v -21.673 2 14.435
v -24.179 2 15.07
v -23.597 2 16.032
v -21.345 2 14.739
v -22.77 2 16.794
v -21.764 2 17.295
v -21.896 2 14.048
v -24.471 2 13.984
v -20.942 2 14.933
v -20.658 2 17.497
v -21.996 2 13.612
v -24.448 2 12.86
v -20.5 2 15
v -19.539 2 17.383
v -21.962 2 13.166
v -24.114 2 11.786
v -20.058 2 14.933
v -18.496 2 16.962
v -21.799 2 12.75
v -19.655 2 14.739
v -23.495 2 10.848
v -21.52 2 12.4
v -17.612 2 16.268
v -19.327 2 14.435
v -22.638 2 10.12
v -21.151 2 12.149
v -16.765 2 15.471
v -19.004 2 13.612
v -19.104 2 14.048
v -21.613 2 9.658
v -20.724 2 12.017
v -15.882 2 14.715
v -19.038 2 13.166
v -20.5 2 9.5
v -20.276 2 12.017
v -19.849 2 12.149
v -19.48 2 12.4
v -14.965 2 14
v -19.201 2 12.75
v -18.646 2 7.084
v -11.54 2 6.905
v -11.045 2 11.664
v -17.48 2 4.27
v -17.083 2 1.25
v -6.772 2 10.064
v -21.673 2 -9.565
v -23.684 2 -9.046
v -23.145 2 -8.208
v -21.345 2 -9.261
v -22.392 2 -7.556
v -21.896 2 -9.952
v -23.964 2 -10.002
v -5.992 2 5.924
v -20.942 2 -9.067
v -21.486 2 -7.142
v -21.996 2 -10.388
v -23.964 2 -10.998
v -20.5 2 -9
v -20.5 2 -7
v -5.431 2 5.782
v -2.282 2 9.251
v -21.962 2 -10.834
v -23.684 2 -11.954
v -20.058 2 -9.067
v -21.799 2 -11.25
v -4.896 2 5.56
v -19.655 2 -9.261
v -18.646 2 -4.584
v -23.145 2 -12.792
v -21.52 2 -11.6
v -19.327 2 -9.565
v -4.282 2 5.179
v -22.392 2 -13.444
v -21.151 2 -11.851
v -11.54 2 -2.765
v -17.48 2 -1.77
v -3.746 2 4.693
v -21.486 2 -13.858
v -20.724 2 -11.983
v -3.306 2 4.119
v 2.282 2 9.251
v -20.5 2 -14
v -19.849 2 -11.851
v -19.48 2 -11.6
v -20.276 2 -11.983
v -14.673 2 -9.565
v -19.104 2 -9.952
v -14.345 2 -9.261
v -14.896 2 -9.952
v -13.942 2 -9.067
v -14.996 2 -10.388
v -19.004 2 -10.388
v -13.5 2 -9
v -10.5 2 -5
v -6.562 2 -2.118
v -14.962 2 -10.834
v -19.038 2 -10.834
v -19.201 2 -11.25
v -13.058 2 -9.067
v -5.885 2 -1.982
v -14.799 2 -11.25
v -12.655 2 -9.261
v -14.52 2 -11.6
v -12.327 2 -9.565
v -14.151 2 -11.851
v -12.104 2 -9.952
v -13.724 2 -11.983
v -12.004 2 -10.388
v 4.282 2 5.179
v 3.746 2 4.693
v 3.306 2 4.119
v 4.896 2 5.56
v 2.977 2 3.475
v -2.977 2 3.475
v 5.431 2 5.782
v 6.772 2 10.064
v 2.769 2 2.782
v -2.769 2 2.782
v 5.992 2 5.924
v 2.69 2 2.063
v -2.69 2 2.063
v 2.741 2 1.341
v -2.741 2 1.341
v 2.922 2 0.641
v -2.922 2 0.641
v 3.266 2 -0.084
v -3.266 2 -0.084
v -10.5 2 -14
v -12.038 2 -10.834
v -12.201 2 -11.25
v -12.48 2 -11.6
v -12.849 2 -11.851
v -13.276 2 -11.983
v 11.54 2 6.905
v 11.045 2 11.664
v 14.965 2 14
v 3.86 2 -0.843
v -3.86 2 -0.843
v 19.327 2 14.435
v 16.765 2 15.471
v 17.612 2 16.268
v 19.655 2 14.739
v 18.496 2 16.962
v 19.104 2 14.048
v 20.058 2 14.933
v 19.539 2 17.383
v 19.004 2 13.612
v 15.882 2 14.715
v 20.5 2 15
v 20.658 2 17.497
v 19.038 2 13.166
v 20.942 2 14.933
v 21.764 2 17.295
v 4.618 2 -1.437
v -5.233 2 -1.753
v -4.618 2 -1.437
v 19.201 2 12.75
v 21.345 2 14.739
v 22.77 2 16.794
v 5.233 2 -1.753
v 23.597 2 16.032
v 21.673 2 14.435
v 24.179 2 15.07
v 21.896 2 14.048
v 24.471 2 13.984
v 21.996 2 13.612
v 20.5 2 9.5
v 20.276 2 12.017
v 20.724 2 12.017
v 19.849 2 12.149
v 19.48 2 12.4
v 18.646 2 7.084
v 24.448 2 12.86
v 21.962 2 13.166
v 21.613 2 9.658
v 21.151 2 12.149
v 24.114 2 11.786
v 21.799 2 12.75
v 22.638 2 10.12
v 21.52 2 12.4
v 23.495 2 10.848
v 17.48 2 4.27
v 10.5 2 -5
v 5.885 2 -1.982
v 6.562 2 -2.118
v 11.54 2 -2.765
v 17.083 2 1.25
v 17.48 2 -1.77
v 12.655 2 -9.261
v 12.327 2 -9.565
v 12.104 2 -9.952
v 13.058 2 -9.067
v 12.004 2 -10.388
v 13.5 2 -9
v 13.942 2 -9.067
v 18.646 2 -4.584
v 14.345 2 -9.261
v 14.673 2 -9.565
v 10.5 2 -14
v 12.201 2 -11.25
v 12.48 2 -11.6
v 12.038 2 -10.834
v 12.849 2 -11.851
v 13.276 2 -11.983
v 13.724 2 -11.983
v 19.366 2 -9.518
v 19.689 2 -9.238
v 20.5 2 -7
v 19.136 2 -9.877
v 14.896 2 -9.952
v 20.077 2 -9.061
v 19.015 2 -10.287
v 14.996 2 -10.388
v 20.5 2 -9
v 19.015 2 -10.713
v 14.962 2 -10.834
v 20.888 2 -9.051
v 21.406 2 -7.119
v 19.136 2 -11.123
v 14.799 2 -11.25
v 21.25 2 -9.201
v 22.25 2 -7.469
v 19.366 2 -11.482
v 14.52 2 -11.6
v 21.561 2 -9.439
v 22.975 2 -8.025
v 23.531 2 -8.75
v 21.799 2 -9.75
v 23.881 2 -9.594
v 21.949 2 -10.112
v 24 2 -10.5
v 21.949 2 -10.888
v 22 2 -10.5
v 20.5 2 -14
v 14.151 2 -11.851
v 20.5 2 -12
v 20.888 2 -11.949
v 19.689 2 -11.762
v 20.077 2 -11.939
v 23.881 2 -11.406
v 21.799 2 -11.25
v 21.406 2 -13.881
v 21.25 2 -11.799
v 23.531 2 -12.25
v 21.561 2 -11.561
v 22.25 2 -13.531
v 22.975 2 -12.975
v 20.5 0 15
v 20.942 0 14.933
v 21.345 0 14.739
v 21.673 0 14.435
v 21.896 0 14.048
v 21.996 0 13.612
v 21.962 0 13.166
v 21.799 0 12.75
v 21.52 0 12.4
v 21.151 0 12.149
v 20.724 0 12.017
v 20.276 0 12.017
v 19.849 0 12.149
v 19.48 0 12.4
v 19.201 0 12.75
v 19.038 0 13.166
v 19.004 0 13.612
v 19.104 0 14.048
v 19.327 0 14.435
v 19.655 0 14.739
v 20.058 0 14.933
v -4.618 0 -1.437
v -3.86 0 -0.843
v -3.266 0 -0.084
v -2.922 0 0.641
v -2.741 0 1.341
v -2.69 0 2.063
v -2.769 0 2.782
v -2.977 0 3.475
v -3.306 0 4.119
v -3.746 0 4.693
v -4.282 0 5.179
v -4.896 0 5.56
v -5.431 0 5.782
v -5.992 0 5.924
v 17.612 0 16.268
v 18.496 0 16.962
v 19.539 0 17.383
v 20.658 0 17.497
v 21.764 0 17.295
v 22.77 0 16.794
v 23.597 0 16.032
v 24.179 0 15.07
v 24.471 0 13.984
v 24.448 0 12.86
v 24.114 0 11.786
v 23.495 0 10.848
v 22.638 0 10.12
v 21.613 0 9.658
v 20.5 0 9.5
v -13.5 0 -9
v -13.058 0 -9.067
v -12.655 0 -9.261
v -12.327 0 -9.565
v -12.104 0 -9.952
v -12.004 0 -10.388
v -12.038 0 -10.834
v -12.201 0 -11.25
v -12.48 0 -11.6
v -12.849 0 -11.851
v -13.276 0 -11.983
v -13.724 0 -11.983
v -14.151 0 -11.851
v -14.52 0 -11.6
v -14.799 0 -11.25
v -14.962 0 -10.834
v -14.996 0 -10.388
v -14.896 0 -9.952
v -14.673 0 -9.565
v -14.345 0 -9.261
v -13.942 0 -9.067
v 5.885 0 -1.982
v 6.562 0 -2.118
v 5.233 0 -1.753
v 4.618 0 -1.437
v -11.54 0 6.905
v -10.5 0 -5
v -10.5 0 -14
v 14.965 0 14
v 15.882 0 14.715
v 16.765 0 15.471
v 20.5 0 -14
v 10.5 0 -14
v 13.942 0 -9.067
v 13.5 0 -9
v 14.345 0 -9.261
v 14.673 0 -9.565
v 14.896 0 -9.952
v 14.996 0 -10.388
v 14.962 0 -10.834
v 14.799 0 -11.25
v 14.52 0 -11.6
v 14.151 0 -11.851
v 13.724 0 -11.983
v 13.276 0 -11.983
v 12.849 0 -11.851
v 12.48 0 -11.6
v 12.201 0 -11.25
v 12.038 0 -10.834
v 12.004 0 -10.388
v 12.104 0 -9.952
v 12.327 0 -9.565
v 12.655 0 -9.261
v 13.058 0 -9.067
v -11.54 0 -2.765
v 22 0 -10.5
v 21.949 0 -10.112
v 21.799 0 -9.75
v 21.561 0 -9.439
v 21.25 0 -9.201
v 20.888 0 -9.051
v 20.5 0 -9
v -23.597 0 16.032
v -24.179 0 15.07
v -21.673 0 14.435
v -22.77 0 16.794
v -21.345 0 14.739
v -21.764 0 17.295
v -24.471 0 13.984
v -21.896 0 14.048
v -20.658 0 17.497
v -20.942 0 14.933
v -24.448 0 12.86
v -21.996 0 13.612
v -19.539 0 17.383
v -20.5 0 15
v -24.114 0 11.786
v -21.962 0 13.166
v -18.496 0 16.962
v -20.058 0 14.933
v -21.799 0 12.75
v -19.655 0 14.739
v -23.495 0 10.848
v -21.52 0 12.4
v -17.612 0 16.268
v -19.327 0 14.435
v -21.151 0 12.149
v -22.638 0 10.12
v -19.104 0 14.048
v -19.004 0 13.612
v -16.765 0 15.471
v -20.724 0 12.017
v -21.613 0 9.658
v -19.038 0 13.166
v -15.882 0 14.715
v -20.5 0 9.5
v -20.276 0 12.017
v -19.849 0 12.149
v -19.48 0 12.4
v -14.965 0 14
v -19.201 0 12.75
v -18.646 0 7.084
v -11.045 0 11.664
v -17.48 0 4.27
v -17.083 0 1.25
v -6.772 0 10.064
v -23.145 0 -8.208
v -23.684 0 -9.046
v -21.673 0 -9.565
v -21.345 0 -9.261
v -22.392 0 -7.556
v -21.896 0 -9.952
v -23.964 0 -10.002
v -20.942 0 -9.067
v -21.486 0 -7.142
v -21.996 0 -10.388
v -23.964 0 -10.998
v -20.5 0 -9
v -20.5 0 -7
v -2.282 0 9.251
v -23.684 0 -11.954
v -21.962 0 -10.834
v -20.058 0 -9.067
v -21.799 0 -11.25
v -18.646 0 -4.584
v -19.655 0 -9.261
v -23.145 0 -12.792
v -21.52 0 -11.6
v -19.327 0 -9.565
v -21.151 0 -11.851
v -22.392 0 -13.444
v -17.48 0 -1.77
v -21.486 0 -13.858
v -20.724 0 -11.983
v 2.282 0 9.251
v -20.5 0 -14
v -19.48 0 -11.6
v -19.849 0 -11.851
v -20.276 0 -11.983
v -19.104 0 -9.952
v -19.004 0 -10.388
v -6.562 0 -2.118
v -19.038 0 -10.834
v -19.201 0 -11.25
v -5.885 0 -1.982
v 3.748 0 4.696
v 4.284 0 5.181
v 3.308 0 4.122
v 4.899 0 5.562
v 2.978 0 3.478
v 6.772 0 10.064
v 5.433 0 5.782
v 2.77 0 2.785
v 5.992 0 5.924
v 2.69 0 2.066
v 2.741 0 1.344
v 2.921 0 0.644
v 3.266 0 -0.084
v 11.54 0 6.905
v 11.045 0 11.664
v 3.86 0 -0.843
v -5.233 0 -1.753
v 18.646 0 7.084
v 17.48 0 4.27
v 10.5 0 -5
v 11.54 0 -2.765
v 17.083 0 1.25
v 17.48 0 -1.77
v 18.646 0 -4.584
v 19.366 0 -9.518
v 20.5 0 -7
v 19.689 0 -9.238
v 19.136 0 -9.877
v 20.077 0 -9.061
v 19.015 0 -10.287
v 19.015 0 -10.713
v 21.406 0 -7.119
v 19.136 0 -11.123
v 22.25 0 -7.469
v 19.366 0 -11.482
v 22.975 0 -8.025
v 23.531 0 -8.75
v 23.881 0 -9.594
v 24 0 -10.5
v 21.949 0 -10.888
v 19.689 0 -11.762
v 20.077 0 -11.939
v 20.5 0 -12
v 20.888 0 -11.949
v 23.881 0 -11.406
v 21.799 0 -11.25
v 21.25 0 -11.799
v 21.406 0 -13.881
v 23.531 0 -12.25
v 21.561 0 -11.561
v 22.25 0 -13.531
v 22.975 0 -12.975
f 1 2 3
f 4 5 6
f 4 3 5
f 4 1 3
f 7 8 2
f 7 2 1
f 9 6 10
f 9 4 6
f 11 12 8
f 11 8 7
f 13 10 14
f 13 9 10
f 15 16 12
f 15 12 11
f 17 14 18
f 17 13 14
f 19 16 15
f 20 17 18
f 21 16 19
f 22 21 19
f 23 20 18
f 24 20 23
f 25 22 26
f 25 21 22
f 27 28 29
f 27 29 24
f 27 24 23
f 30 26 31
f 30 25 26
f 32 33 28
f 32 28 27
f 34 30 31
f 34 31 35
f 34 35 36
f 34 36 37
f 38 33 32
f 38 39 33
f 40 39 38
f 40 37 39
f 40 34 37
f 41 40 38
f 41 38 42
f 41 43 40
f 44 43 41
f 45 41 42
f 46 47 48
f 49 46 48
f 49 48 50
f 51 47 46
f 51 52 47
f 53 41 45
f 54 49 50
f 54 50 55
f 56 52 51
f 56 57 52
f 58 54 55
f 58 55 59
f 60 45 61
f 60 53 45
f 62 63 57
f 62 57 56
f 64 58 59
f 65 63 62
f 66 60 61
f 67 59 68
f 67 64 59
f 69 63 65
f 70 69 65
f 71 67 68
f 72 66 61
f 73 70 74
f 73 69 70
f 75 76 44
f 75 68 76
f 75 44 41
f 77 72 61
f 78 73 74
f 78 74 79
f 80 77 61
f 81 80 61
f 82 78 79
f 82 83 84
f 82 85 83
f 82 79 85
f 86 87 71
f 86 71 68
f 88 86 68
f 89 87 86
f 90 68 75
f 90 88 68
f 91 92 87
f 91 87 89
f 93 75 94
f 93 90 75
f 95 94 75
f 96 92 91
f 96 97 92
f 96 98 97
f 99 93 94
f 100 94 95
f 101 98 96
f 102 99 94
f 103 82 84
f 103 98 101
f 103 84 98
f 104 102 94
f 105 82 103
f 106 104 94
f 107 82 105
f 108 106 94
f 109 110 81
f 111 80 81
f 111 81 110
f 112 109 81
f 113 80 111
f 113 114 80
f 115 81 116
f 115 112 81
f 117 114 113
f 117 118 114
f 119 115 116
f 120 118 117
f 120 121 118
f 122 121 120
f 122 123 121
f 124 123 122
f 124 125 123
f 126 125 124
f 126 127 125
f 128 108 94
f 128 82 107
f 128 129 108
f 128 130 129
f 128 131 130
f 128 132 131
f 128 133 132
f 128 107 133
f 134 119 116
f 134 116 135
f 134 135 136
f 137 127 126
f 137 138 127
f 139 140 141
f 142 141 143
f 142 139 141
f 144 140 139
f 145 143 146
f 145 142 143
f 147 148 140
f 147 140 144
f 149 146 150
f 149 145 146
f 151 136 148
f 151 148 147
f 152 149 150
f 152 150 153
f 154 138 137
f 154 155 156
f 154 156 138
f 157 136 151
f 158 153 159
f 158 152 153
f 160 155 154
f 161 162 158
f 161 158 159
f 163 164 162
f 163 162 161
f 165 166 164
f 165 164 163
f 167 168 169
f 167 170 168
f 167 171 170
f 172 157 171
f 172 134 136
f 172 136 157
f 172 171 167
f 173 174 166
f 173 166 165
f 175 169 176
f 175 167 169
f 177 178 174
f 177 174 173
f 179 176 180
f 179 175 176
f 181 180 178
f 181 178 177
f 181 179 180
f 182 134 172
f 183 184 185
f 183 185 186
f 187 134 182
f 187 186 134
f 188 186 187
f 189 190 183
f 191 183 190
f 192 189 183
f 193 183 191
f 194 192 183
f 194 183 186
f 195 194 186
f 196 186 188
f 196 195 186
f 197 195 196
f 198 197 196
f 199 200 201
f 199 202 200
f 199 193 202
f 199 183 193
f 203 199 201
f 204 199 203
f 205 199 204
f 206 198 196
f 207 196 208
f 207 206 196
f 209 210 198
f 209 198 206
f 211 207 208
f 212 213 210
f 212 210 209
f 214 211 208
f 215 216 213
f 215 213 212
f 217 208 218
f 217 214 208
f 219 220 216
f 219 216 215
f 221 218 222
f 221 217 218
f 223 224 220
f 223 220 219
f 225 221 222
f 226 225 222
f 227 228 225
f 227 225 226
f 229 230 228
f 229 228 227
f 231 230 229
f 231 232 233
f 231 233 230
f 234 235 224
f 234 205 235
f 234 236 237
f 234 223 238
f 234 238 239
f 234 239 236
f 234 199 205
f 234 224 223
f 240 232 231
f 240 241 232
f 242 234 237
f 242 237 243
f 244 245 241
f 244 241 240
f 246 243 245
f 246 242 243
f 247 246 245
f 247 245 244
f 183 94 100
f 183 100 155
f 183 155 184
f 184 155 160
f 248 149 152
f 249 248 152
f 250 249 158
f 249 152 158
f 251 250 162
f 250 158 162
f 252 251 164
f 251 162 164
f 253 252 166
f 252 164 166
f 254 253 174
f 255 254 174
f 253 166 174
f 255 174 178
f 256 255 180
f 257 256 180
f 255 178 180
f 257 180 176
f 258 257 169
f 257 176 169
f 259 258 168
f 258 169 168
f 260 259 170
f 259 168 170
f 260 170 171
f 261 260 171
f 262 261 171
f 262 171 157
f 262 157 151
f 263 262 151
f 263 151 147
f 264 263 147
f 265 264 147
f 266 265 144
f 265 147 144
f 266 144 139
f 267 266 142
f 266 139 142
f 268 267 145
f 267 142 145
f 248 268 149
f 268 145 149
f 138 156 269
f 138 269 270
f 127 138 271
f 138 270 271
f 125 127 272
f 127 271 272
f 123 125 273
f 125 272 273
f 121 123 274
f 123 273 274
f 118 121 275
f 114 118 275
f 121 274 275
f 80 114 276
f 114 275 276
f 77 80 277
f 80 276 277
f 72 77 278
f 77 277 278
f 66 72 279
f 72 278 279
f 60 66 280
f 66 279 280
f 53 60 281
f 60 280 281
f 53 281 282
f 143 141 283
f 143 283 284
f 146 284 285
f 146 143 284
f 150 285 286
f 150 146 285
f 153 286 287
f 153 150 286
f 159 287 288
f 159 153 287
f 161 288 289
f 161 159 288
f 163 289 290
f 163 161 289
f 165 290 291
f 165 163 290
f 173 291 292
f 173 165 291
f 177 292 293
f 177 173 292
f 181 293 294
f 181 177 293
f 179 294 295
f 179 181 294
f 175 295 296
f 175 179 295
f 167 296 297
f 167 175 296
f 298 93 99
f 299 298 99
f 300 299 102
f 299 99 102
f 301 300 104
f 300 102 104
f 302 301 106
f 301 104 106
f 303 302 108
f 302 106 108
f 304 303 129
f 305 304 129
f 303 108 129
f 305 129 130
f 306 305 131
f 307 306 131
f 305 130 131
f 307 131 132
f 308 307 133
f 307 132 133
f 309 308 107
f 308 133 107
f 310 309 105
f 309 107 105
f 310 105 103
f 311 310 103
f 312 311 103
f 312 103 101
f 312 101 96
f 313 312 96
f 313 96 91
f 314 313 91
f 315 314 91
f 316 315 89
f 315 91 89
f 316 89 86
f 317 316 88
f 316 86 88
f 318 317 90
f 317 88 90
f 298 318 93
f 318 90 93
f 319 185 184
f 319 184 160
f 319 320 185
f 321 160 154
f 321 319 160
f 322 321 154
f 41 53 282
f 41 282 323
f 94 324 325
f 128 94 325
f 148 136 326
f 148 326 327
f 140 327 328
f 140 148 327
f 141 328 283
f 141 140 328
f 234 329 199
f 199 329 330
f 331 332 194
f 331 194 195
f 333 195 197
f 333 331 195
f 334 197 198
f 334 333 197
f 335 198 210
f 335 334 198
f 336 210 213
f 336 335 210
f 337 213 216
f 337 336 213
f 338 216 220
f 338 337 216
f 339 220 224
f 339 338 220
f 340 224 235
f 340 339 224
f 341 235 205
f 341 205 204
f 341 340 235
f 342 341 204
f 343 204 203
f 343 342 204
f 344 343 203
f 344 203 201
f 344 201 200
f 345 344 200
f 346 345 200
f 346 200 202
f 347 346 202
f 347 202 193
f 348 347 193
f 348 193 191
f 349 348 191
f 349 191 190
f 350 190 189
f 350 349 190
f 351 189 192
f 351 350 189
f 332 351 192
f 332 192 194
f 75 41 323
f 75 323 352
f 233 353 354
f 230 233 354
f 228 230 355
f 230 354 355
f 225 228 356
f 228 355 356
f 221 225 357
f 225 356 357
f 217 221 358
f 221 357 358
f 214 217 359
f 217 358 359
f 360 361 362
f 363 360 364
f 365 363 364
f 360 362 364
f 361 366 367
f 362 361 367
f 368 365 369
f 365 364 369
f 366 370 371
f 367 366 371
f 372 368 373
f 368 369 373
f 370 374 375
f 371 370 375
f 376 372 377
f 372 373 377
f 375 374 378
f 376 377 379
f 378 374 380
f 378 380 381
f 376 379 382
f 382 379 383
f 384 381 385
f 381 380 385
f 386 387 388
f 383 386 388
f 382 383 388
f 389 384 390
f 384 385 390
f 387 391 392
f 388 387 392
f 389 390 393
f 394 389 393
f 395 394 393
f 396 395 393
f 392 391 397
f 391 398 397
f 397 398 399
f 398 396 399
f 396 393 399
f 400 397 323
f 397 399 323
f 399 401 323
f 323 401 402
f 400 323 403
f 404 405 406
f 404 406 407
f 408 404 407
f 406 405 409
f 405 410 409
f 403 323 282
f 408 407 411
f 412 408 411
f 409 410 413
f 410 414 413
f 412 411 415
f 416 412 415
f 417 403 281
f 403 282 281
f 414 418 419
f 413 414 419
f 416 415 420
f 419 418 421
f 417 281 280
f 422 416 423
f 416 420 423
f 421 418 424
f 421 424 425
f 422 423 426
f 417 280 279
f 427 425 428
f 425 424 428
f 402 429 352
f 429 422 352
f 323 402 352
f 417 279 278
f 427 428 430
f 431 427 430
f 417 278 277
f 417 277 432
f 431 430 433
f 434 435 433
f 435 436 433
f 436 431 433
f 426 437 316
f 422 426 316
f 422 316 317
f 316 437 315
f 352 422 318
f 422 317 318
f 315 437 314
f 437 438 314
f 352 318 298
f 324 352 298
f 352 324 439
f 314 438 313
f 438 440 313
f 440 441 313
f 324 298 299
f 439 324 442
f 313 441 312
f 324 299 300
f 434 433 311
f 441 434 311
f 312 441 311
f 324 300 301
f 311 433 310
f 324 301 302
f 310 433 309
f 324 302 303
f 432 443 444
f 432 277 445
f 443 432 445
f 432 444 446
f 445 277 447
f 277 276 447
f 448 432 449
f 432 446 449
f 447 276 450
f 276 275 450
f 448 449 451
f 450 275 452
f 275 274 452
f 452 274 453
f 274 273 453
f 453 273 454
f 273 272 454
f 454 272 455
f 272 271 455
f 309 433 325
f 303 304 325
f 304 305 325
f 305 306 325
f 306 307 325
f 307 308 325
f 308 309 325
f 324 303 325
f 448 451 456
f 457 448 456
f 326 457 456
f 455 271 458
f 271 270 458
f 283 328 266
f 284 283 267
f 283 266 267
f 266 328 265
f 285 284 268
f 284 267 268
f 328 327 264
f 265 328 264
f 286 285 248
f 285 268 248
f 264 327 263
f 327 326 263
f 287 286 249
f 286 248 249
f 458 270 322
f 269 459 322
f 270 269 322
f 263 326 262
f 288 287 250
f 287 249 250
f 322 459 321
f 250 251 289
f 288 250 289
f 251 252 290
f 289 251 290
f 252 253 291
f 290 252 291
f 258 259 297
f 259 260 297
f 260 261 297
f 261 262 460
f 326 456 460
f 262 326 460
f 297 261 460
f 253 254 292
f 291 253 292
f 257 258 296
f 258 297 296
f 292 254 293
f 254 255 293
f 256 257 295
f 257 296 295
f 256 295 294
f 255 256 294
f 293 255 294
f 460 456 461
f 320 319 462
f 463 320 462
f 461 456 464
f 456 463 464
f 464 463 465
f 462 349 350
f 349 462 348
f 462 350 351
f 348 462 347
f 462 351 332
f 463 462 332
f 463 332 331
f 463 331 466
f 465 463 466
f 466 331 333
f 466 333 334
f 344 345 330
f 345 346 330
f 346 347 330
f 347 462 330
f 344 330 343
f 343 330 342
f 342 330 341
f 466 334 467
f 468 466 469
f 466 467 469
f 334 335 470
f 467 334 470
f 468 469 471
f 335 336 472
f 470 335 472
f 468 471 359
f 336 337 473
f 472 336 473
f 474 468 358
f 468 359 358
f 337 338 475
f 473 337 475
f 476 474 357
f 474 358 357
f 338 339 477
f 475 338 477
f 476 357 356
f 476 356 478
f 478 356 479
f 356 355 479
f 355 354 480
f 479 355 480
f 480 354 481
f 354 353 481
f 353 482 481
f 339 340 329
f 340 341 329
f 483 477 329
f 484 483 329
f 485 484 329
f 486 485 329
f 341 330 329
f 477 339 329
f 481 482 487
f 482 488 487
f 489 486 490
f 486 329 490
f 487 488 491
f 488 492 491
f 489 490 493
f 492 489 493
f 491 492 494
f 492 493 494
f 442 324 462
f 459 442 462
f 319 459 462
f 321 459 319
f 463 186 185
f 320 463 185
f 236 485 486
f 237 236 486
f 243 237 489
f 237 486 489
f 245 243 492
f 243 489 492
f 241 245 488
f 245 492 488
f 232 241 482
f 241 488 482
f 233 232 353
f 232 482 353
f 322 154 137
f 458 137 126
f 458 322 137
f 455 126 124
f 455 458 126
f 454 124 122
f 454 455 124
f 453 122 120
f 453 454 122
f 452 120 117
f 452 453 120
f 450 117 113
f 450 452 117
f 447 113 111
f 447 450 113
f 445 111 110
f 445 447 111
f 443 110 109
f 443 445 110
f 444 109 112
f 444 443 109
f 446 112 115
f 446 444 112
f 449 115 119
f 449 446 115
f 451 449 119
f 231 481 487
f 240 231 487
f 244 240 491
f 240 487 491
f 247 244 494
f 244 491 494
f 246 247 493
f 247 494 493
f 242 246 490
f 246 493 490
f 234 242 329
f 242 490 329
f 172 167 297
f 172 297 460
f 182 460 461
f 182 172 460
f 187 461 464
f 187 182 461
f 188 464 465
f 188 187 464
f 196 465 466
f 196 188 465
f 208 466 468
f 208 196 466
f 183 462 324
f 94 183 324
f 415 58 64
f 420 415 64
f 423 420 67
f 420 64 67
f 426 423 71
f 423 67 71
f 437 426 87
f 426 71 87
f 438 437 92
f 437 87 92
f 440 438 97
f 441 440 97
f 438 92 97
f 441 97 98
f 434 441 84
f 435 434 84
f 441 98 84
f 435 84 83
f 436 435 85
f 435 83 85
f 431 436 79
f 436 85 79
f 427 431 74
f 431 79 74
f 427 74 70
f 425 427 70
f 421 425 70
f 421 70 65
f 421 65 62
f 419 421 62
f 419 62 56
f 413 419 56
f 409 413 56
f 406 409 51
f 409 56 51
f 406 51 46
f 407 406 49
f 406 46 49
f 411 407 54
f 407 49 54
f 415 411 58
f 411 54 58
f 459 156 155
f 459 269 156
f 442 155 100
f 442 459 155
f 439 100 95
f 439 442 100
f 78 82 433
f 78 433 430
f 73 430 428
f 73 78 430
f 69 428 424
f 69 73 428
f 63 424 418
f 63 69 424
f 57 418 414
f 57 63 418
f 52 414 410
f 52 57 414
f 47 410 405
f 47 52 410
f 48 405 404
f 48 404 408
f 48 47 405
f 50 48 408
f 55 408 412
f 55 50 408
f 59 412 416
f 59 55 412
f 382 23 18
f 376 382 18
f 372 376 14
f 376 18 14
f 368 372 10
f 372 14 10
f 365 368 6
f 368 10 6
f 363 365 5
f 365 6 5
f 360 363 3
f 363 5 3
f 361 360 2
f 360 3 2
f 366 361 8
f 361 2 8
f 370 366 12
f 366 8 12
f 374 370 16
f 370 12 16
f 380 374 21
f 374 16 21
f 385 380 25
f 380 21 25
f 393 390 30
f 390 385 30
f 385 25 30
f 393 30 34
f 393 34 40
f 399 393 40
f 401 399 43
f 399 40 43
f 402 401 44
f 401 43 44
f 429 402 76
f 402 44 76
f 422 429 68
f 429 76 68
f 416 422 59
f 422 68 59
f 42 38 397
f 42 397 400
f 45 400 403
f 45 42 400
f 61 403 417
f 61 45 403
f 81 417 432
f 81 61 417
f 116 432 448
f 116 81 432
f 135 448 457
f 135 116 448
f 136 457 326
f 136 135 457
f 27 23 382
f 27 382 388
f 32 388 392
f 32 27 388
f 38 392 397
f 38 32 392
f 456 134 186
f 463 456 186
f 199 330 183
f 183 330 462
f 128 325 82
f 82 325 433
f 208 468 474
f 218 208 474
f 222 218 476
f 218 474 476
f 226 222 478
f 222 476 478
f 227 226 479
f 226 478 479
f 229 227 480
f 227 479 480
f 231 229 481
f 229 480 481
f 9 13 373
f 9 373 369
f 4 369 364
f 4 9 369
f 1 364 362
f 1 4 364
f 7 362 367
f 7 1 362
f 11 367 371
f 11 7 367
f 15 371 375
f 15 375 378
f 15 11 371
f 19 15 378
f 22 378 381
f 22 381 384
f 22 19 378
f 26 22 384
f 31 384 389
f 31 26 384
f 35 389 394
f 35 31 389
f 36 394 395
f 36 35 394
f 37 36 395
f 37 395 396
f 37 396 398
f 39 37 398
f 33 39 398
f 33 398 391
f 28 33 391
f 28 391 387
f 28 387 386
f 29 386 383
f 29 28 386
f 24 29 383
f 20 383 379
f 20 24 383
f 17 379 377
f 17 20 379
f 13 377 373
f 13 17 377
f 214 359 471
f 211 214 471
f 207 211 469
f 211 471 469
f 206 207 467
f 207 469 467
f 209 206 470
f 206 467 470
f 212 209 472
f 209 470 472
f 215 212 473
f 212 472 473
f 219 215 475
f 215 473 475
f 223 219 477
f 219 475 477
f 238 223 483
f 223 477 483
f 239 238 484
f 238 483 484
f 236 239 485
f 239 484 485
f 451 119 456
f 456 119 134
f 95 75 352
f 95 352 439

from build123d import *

# Parameters (mm, degrees)
SKETCH1_R             = 1.5
BOSS_EXTRUDE1_DEPTH   = 2
SKETCH2_R             = 3.5
BOSS_EXTRUDE2_DEPTH   = 2
SKETCH3_R             = 1.5
CUT_EXTRUDE1_DEPTH    = 2
SKETCH4_R             = 1.5
CUT_EXTRUDE2_DEPTH    = 2
BOSS_EXTRUDE3_START   = -2
BOSS_EXTRUDE3_DEPTH   = 2
SKETCH8_R             = 4
BOSS_EXTRUDE5_DEPTH   = 2
SKETCH9_R             = 1.5
CUT_EXTRUDE4_DEPTH    = 2
CUT_EXTRUDE5_DEPTH    = 2
BOSS_EXTRUDE12_DEPTH  = 2
CUT_EXTRUDE11_DEPTH   = 2
CUT_EXTRUDE15_DEPTH   = 19
FILLET1_R             = 5
FILLET2_R             = 4
FILLET1_OF_MIRROR13_R = 5
FILLET2_OF_MIRROR13_R = 4


with BuildPart() as part:
    # Sketch1 → Boss-Extrude1 (new body)
    # profile 1 of 5: a face of its own
    with BuildSketch(Plane(origin=(0, 0, 0), x_dir=(1, 0, 0), z_dir=(0, 1, 0))):
        with BuildLine():
            Line((20.5, 14), (10.5, 14))
            Line((10.5, 14), (10.5, 5))
            Line((10.5, 5), (-10.5, 5))
            Line((-10.5, 5), (-10.5, 14))
            Line((-10.5, 14), (-20.5, 14))
            Line((-20.5, 14), (-20.5, -14))
            ThreePointArc((-20.5, -14), (0, -5.789884137), (20.5, -14))
            Line((20.5, -14), (20.5, 7))
            ThreePointArc((20.5, 7), (17, 10.5), (20.5, 14))
        make_face()
        with Locations(Location((13.5, 10.5, 0), (0, 0, 270))):
            Circle(SKETCH1_R, mode=Mode.SUBTRACT)
    # profile 2 of 5: a face of its own
    with BuildSketch(Plane(origin=(0, 0, 0), x_dir=(1, 0, 0), z_dir=(0, 1, 0))):
        with BuildLine():
            ThreePointArc((24, 10.5), (22.974873734, 12.974873734), (20.5, 14))
            Line((20.5, 14), (20.5, 12))
            ThreePointArc((20.5, 12), (21.560660172, 11.560660172), (22, 10.5))
            ThreePointArc((22, 10.5), (21.560660172, 9.439339828), (20.5, 9))
            Line((20.5, 9), (20.5, 7))
            ThreePointArc((20.5, 7), (22.974873734, 8.025126266), (24, 10.5))
        make_face()
    # profile 3 of 5: a face of its own
    with BuildSketch(Plane(origin=(0, 0, 0), x_dir=(1, 0, 0), z_dir=(0, 1, 0))):
        with BuildLine():
            Line((20.5, 12), (20.5, 14))
            ThreePointArc((20.5, 14), (17, 10.5), (20.5, 7))
            Line((20.5, 7), (20.5, 9))
            ThreePointArc((20.5, 9), (19, 10.5), (20.5, 12))
        make_face()
    # profile 4 of 5: a face of its own
    with BuildSketch(Plane(origin=(0, 0, 0), x_dir=(1, 0, 0), z_dir=(0, 1, 0))):
        with BuildLine():
            ThreePointArc((24, 10.5), (22.974873734, 12.974873734), (20.5, 14))
            Line((20.5, 14), (20.5, 12))
            ThreePointArc((20.5, 12), (21.560660172, 11.560660172), (22, 10.5))
            ThreePointArc((22, 10.5), (21.560660172, 9.439339828), (20.5, 9))
            Line((20.5, 9), (20.5, 7))
            ThreePointArc((20.5, 7), (22.974873734, 8.025126266), (24, 10.5))
        make_face()
    # profile 5 of 5: a face of its own
    with BuildSketch(Plane(origin=(0, 0, 0), x_dir=(1, 0, 0), z_dir=(0, 1, 0))):
        with BuildLine():
            Line((20.5, 12), (20.5, 14))
            ThreePointArc((20.5, 14), (17, 10.5), (20.5, 7))
            Line((20.5, 7), (20.5, 9))
            ThreePointArc((20.5, 9), (19, 10.5), (20.5, 12))
        make_face()
    extrude(amount=BOSS_EXTRUDE1_DEPTH)

    # Sketch2 → Boss-Extrude2 (add)
    with BuildSketch(Plane(origin=(0, 2, 0), x_dir=(1, 0, 0), z_dir=(0, 1, 0))):
        with Locations((-20.5, 10.5)):
            Circle(SKETCH2_R)
    extrude(amount=-BOSS_EXTRUDE2_DEPTH)

    # Sketch3 → Cut-Extrude1 (cut)
    with BuildSketch(Plane(origin=(0, 2, 0), x_dir=(1, 0, 0), z_dir=(0, 1, 0))):
        with Locations(Location((-20.5, 10.5, 0), (0, 0, 270))):
            Circle(SKETCH3_R)
    extrude(amount=-CUT_EXTRUDE1_DEPTH, mode=Mode.SUBTRACT)

    # Sketch4 → Cut-Extrude2 (cut)
    with BuildSketch(Plane(origin=(0, 2, 0), x_dir=(1, 0, 0), z_dir=(0, 1, 0))):
        with Locations(Location((-13.5, 10.5, 0), (0, 0, 270))):
            Circle(SKETCH4_R)
    extrude(amount=-CUT_EXTRUDE2_DEPTH, mode=Mode.SUBTRACT)

    # Sketch5 → Boss-Extrude3 (add)
    with BuildSketch(Plane(origin=(0, 2, 0), x_dir=(1, 0, 0), z_dir=(0, 1, 0)).offset(BOSS_EXTRUDE3_START)):
        with BuildLine():
            Line((-20.5, -14), (20.5, -14))
            ThreePointArc((20.5, -14), (0, -5.789884137), (-20.5, -14))
        make_face()
    extrude(amount=BOSS_EXTRUDE3_DEPTH)

    # Sketch8 → Boss-Extrude5 (add)
    with BuildSketch(Plane(origin=(0, 2, 0), x_dir=(1, 0, 0), z_dir=(0, 1, 0))):
        with Locations((20.5, -13.5)):
            Circle(SKETCH8_R)
    boss_extrude5 = extrude(amount=-BOSS_EXTRUDE5_DEPTH)

    # Sketch9 → Cut-Extrude4 (cut)
    with BuildSketch(Plane(origin=(0, 2, 0), x_dir=(1, 0, 0), z_dir=(0, 1, 0))):
        with Locations(Location((20.5, -13.5, 0), (0, 0, 270))):
            Circle(SKETCH9_R)
    cut_extrude4 = extrude(amount=-CUT_EXTRUDE4_DEPTH, mode=Mode.SUBTRACT)

    # Sketch10 → Cut-Extrude5 (cut)
    with BuildSketch(Plane(origin=(0, 2, 0), x_dir=(1, 0, 0), z_dir=(0, 1, 0))):
        with BuildLine():
            Line((20.5, 7), (20.5, -9.5))
            ThreePointArc((20.5, -9.5), (17.08273811, -1.25), (20.5, 7))
        make_face()
    cut_extrude5 = extrude(amount=-CUT_EXTRUDE5_DEPTH, mode=Mode.SUBTRACT)

    # Mirror12: Boss-Extrude5, Cut-Extrude4, Cut-Extrude5 across plane
    add(boss_extrude5.mirror(Plane(origin=(0, 0, 0), x_dir=(0, 0, 1), z_dir=(1, 0, 0))))
    add(cut_extrude4.mirror(Plane(origin=(0, 0, 0), x_dir=(0, 0, 1), z_dir=(1, 0, 0))), mode=Mode.SUBTRACT)
    add(cut_extrude5.mirror(Plane(origin=(0, 0, 0), x_dir=(0, 0, 1), z_dir=(1, 0, 0))), mode=Mode.SUBTRACT)

    # Sketch12 → Boss-Extrude12 (add)
    with BuildSketch(Plane(origin=(0, 2, 0), x_dir=(1, 0, 0), z_dir=(0, 1, 0))):
        with BuildLine():
            Line((-14.965299889, -14), (-16.531373033, -14))
            ThreePointArc((-16.531373033, -14), (-16.889121467, -15.220917262), (-17.61216057, -16.267739768))
            ThreePointArc((-17.61216057, -16.267739768), (-16.328147274, -15.087863095), (-14.965299889, -14))
        make_face()
        with BuildLine():
            Line((16.531373033, -14), (14.965299889, -14))
            ThreePointArc((14.965299889, -14), (16.328147274, -15.087863095), (17.61216057, -16.267739768))
            ThreePointArc((17.61216057, -16.267739768), (16.889121467, -15.220917262), (16.531373033, -14))
        make_face()
    extrude(amount=-BOSS_EXTRUDE12_DEPTH)

    # Sketch20 → Cut-Extrude11 (cut)
    with BuildSketch(Plane(origin=(0, 2, 0), x_dir=(1, 0, 0), z_dir=(0, 1, 0))):
        with BuildLine():
            Line((14.965299889, -14), (-14.965299889, -14))
            ThreePointArc((-14.965299889, -14), (0, -9.149002287), (14.965299889, -14))
        make_face()
    extrude(amount=-CUT_EXTRUDE11_DEPTH, mode=Mode.SUBTRACT)

    # Sketch21 → Cut-Extrude15 (cut)
    with BuildSketch(Plane(origin=(0, 2, 0), x_dir=(1, 0, 0), z_dir=(0, 1, 0))):
        Polygon((11.539683191, 2.764795759), (2.206859121, 1.551865555), (2.206859121, -5.254020589), (11.539683191, -6.904953367), (11.539683191, -2.592312642), align=None)
    cut_extrude15 = extrude(amount=-CUT_EXTRUDE15_DEPTH, mode=Mode.SUBTRACT)

    # Fillet1
    fillet1_edges = [part.edges().sort_by_distance(p)[0] for p in [
        (2.206859121, 1, -1.551865555),
    ]]
    fillet(fillet1_edges, radius=FILLET1_R)

    # Fillet2
    fillet2_edges = [part.edges().sort_by_distance(p)[0] for p in [
        (2.206859121, 1, 5.254020589),
    ]]
    fillet(fillet2_edges, radius=FILLET2_R)

    # Mirror13: Cut-Extrude15 across plane
    add(cut_extrude15.mirror(Plane(origin=(0, 0, 0), x_dir=(0, 0, 1), z_dir=(1, 0, 0))), mode=Mode.SUBTRACT)

    # Fillet1 of Mirror13
    fillet1_of_mirror13_edges = [part.edges().sort_by_distance(p)[0] for p in [
        (-2.206859121, 1, -1.551865555),
    ]]
    fillet(fillet1_of_mirror13_edges, radius=FILLET1_OF_MIRROR13_R)

    # Fillet2 of Mirror13
    fillet2_of_mirror13_edges = [part.edges().sort_by_distance(p)[0] for p in [
        (-2.206859121, 1, 5.254020589),
    ]]
    fillet(fillet2_of_mirror13_edges, radius=FILLET2_OF_MIRROR13_R)


solid = part.part
